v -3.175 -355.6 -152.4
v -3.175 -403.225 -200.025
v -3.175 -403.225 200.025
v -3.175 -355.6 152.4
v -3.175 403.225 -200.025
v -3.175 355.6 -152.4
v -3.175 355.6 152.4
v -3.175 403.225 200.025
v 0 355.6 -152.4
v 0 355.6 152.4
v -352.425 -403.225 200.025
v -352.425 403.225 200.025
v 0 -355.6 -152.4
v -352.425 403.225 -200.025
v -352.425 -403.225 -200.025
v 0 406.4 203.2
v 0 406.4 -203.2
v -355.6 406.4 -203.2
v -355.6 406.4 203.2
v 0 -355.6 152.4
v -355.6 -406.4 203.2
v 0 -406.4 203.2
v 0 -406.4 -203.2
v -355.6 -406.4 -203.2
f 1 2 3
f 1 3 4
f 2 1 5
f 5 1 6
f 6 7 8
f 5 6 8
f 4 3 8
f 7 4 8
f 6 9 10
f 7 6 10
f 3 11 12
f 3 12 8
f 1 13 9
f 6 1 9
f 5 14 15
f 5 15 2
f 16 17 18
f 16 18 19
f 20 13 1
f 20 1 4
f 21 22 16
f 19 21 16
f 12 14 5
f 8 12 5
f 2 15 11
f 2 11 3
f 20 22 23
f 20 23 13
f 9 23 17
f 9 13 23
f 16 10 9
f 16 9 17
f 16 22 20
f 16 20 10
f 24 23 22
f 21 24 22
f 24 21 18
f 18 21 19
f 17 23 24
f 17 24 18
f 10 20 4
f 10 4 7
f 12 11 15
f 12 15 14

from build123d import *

# Parameters (mm, degrees)
F0_W      = 812.8
F0_H      = 406.4
F1_DEPTH  = 355.6
F2_W      = 711.2
F2_H      = 304.8
F3_DEPTH  = 352.425
F4_W      = 349.25
F4_H      = 304.8
F5_DEPTH  = 47.625
F6_W      = 349.25
F6_H      = 304.8
F7_DEPTH  = 47.625
F8_W      = 349.25
F8_H      = 806.45
F9_DEPTH  = 47.625
F10_W     = 349.25
F10_H     = 806.45
F11_DEPTH = 47.625


with BuildPart() as f1:
    # F0 (on Right) → F1 (new body)
    with BuildSketch(Plane.YZ):
        Rectangle(F0_W, F0_H)
    extrude(amount=-F1_DEPTH)

    # F2 (on face) → F3 (cut)
    with BuildSketch(Plane.YZ):
        Rectangle(F2_W, F2_H)
    extrude(amount=-F3_DEPTH, mode=Mode.SUBTRACT)

    # F4 (on face) → F5 (cut)
    with BuildSketch(Plane(origin=(0, -355.6, 0), x_dir=(-1, 0, 0), z_dir=(0, 1, 0))):
        with Locations((177.8, 0)):
            Rectangle(F4_W, F4_H)
    extrude(amount=-F5_DEPTH, mode=Mode.SUBTRACT)

    # F6 (on face) → F7 (cut)
    with BuildSketch(Plane.XZ.offset(-355.6)):
        with Locations((-177.8, 0)):
            Rectangle(F6_W, F6_H)
    extrude(amount=-F7_DEPTH, mode=Mode.SUBTRACT)

    # F8 (on face) → F9 (cut)
    with BuildSketch(Plane(origin=(0, 0, 152.4), x_dir=(1, 0, 0), z_dir=(0, 0, -1))):
        with Locations((-177.8, 0)):
            Rectangle(F8_W, F8_H)
    extrude(amount=-F9_DEPTH, mode=Mode.SUBTRACT)

    # F10 (on face) → F11 (cut)
    with BuildSketch(Plane.XY.offset(-152.4)):
        with Locations((-177.8, 0)):
            Rectangle(F10_W, F10_H)
    extrude(amount=-F11_DEPTH, mode=Mode.SUBTRACT)


solid = f1.part
